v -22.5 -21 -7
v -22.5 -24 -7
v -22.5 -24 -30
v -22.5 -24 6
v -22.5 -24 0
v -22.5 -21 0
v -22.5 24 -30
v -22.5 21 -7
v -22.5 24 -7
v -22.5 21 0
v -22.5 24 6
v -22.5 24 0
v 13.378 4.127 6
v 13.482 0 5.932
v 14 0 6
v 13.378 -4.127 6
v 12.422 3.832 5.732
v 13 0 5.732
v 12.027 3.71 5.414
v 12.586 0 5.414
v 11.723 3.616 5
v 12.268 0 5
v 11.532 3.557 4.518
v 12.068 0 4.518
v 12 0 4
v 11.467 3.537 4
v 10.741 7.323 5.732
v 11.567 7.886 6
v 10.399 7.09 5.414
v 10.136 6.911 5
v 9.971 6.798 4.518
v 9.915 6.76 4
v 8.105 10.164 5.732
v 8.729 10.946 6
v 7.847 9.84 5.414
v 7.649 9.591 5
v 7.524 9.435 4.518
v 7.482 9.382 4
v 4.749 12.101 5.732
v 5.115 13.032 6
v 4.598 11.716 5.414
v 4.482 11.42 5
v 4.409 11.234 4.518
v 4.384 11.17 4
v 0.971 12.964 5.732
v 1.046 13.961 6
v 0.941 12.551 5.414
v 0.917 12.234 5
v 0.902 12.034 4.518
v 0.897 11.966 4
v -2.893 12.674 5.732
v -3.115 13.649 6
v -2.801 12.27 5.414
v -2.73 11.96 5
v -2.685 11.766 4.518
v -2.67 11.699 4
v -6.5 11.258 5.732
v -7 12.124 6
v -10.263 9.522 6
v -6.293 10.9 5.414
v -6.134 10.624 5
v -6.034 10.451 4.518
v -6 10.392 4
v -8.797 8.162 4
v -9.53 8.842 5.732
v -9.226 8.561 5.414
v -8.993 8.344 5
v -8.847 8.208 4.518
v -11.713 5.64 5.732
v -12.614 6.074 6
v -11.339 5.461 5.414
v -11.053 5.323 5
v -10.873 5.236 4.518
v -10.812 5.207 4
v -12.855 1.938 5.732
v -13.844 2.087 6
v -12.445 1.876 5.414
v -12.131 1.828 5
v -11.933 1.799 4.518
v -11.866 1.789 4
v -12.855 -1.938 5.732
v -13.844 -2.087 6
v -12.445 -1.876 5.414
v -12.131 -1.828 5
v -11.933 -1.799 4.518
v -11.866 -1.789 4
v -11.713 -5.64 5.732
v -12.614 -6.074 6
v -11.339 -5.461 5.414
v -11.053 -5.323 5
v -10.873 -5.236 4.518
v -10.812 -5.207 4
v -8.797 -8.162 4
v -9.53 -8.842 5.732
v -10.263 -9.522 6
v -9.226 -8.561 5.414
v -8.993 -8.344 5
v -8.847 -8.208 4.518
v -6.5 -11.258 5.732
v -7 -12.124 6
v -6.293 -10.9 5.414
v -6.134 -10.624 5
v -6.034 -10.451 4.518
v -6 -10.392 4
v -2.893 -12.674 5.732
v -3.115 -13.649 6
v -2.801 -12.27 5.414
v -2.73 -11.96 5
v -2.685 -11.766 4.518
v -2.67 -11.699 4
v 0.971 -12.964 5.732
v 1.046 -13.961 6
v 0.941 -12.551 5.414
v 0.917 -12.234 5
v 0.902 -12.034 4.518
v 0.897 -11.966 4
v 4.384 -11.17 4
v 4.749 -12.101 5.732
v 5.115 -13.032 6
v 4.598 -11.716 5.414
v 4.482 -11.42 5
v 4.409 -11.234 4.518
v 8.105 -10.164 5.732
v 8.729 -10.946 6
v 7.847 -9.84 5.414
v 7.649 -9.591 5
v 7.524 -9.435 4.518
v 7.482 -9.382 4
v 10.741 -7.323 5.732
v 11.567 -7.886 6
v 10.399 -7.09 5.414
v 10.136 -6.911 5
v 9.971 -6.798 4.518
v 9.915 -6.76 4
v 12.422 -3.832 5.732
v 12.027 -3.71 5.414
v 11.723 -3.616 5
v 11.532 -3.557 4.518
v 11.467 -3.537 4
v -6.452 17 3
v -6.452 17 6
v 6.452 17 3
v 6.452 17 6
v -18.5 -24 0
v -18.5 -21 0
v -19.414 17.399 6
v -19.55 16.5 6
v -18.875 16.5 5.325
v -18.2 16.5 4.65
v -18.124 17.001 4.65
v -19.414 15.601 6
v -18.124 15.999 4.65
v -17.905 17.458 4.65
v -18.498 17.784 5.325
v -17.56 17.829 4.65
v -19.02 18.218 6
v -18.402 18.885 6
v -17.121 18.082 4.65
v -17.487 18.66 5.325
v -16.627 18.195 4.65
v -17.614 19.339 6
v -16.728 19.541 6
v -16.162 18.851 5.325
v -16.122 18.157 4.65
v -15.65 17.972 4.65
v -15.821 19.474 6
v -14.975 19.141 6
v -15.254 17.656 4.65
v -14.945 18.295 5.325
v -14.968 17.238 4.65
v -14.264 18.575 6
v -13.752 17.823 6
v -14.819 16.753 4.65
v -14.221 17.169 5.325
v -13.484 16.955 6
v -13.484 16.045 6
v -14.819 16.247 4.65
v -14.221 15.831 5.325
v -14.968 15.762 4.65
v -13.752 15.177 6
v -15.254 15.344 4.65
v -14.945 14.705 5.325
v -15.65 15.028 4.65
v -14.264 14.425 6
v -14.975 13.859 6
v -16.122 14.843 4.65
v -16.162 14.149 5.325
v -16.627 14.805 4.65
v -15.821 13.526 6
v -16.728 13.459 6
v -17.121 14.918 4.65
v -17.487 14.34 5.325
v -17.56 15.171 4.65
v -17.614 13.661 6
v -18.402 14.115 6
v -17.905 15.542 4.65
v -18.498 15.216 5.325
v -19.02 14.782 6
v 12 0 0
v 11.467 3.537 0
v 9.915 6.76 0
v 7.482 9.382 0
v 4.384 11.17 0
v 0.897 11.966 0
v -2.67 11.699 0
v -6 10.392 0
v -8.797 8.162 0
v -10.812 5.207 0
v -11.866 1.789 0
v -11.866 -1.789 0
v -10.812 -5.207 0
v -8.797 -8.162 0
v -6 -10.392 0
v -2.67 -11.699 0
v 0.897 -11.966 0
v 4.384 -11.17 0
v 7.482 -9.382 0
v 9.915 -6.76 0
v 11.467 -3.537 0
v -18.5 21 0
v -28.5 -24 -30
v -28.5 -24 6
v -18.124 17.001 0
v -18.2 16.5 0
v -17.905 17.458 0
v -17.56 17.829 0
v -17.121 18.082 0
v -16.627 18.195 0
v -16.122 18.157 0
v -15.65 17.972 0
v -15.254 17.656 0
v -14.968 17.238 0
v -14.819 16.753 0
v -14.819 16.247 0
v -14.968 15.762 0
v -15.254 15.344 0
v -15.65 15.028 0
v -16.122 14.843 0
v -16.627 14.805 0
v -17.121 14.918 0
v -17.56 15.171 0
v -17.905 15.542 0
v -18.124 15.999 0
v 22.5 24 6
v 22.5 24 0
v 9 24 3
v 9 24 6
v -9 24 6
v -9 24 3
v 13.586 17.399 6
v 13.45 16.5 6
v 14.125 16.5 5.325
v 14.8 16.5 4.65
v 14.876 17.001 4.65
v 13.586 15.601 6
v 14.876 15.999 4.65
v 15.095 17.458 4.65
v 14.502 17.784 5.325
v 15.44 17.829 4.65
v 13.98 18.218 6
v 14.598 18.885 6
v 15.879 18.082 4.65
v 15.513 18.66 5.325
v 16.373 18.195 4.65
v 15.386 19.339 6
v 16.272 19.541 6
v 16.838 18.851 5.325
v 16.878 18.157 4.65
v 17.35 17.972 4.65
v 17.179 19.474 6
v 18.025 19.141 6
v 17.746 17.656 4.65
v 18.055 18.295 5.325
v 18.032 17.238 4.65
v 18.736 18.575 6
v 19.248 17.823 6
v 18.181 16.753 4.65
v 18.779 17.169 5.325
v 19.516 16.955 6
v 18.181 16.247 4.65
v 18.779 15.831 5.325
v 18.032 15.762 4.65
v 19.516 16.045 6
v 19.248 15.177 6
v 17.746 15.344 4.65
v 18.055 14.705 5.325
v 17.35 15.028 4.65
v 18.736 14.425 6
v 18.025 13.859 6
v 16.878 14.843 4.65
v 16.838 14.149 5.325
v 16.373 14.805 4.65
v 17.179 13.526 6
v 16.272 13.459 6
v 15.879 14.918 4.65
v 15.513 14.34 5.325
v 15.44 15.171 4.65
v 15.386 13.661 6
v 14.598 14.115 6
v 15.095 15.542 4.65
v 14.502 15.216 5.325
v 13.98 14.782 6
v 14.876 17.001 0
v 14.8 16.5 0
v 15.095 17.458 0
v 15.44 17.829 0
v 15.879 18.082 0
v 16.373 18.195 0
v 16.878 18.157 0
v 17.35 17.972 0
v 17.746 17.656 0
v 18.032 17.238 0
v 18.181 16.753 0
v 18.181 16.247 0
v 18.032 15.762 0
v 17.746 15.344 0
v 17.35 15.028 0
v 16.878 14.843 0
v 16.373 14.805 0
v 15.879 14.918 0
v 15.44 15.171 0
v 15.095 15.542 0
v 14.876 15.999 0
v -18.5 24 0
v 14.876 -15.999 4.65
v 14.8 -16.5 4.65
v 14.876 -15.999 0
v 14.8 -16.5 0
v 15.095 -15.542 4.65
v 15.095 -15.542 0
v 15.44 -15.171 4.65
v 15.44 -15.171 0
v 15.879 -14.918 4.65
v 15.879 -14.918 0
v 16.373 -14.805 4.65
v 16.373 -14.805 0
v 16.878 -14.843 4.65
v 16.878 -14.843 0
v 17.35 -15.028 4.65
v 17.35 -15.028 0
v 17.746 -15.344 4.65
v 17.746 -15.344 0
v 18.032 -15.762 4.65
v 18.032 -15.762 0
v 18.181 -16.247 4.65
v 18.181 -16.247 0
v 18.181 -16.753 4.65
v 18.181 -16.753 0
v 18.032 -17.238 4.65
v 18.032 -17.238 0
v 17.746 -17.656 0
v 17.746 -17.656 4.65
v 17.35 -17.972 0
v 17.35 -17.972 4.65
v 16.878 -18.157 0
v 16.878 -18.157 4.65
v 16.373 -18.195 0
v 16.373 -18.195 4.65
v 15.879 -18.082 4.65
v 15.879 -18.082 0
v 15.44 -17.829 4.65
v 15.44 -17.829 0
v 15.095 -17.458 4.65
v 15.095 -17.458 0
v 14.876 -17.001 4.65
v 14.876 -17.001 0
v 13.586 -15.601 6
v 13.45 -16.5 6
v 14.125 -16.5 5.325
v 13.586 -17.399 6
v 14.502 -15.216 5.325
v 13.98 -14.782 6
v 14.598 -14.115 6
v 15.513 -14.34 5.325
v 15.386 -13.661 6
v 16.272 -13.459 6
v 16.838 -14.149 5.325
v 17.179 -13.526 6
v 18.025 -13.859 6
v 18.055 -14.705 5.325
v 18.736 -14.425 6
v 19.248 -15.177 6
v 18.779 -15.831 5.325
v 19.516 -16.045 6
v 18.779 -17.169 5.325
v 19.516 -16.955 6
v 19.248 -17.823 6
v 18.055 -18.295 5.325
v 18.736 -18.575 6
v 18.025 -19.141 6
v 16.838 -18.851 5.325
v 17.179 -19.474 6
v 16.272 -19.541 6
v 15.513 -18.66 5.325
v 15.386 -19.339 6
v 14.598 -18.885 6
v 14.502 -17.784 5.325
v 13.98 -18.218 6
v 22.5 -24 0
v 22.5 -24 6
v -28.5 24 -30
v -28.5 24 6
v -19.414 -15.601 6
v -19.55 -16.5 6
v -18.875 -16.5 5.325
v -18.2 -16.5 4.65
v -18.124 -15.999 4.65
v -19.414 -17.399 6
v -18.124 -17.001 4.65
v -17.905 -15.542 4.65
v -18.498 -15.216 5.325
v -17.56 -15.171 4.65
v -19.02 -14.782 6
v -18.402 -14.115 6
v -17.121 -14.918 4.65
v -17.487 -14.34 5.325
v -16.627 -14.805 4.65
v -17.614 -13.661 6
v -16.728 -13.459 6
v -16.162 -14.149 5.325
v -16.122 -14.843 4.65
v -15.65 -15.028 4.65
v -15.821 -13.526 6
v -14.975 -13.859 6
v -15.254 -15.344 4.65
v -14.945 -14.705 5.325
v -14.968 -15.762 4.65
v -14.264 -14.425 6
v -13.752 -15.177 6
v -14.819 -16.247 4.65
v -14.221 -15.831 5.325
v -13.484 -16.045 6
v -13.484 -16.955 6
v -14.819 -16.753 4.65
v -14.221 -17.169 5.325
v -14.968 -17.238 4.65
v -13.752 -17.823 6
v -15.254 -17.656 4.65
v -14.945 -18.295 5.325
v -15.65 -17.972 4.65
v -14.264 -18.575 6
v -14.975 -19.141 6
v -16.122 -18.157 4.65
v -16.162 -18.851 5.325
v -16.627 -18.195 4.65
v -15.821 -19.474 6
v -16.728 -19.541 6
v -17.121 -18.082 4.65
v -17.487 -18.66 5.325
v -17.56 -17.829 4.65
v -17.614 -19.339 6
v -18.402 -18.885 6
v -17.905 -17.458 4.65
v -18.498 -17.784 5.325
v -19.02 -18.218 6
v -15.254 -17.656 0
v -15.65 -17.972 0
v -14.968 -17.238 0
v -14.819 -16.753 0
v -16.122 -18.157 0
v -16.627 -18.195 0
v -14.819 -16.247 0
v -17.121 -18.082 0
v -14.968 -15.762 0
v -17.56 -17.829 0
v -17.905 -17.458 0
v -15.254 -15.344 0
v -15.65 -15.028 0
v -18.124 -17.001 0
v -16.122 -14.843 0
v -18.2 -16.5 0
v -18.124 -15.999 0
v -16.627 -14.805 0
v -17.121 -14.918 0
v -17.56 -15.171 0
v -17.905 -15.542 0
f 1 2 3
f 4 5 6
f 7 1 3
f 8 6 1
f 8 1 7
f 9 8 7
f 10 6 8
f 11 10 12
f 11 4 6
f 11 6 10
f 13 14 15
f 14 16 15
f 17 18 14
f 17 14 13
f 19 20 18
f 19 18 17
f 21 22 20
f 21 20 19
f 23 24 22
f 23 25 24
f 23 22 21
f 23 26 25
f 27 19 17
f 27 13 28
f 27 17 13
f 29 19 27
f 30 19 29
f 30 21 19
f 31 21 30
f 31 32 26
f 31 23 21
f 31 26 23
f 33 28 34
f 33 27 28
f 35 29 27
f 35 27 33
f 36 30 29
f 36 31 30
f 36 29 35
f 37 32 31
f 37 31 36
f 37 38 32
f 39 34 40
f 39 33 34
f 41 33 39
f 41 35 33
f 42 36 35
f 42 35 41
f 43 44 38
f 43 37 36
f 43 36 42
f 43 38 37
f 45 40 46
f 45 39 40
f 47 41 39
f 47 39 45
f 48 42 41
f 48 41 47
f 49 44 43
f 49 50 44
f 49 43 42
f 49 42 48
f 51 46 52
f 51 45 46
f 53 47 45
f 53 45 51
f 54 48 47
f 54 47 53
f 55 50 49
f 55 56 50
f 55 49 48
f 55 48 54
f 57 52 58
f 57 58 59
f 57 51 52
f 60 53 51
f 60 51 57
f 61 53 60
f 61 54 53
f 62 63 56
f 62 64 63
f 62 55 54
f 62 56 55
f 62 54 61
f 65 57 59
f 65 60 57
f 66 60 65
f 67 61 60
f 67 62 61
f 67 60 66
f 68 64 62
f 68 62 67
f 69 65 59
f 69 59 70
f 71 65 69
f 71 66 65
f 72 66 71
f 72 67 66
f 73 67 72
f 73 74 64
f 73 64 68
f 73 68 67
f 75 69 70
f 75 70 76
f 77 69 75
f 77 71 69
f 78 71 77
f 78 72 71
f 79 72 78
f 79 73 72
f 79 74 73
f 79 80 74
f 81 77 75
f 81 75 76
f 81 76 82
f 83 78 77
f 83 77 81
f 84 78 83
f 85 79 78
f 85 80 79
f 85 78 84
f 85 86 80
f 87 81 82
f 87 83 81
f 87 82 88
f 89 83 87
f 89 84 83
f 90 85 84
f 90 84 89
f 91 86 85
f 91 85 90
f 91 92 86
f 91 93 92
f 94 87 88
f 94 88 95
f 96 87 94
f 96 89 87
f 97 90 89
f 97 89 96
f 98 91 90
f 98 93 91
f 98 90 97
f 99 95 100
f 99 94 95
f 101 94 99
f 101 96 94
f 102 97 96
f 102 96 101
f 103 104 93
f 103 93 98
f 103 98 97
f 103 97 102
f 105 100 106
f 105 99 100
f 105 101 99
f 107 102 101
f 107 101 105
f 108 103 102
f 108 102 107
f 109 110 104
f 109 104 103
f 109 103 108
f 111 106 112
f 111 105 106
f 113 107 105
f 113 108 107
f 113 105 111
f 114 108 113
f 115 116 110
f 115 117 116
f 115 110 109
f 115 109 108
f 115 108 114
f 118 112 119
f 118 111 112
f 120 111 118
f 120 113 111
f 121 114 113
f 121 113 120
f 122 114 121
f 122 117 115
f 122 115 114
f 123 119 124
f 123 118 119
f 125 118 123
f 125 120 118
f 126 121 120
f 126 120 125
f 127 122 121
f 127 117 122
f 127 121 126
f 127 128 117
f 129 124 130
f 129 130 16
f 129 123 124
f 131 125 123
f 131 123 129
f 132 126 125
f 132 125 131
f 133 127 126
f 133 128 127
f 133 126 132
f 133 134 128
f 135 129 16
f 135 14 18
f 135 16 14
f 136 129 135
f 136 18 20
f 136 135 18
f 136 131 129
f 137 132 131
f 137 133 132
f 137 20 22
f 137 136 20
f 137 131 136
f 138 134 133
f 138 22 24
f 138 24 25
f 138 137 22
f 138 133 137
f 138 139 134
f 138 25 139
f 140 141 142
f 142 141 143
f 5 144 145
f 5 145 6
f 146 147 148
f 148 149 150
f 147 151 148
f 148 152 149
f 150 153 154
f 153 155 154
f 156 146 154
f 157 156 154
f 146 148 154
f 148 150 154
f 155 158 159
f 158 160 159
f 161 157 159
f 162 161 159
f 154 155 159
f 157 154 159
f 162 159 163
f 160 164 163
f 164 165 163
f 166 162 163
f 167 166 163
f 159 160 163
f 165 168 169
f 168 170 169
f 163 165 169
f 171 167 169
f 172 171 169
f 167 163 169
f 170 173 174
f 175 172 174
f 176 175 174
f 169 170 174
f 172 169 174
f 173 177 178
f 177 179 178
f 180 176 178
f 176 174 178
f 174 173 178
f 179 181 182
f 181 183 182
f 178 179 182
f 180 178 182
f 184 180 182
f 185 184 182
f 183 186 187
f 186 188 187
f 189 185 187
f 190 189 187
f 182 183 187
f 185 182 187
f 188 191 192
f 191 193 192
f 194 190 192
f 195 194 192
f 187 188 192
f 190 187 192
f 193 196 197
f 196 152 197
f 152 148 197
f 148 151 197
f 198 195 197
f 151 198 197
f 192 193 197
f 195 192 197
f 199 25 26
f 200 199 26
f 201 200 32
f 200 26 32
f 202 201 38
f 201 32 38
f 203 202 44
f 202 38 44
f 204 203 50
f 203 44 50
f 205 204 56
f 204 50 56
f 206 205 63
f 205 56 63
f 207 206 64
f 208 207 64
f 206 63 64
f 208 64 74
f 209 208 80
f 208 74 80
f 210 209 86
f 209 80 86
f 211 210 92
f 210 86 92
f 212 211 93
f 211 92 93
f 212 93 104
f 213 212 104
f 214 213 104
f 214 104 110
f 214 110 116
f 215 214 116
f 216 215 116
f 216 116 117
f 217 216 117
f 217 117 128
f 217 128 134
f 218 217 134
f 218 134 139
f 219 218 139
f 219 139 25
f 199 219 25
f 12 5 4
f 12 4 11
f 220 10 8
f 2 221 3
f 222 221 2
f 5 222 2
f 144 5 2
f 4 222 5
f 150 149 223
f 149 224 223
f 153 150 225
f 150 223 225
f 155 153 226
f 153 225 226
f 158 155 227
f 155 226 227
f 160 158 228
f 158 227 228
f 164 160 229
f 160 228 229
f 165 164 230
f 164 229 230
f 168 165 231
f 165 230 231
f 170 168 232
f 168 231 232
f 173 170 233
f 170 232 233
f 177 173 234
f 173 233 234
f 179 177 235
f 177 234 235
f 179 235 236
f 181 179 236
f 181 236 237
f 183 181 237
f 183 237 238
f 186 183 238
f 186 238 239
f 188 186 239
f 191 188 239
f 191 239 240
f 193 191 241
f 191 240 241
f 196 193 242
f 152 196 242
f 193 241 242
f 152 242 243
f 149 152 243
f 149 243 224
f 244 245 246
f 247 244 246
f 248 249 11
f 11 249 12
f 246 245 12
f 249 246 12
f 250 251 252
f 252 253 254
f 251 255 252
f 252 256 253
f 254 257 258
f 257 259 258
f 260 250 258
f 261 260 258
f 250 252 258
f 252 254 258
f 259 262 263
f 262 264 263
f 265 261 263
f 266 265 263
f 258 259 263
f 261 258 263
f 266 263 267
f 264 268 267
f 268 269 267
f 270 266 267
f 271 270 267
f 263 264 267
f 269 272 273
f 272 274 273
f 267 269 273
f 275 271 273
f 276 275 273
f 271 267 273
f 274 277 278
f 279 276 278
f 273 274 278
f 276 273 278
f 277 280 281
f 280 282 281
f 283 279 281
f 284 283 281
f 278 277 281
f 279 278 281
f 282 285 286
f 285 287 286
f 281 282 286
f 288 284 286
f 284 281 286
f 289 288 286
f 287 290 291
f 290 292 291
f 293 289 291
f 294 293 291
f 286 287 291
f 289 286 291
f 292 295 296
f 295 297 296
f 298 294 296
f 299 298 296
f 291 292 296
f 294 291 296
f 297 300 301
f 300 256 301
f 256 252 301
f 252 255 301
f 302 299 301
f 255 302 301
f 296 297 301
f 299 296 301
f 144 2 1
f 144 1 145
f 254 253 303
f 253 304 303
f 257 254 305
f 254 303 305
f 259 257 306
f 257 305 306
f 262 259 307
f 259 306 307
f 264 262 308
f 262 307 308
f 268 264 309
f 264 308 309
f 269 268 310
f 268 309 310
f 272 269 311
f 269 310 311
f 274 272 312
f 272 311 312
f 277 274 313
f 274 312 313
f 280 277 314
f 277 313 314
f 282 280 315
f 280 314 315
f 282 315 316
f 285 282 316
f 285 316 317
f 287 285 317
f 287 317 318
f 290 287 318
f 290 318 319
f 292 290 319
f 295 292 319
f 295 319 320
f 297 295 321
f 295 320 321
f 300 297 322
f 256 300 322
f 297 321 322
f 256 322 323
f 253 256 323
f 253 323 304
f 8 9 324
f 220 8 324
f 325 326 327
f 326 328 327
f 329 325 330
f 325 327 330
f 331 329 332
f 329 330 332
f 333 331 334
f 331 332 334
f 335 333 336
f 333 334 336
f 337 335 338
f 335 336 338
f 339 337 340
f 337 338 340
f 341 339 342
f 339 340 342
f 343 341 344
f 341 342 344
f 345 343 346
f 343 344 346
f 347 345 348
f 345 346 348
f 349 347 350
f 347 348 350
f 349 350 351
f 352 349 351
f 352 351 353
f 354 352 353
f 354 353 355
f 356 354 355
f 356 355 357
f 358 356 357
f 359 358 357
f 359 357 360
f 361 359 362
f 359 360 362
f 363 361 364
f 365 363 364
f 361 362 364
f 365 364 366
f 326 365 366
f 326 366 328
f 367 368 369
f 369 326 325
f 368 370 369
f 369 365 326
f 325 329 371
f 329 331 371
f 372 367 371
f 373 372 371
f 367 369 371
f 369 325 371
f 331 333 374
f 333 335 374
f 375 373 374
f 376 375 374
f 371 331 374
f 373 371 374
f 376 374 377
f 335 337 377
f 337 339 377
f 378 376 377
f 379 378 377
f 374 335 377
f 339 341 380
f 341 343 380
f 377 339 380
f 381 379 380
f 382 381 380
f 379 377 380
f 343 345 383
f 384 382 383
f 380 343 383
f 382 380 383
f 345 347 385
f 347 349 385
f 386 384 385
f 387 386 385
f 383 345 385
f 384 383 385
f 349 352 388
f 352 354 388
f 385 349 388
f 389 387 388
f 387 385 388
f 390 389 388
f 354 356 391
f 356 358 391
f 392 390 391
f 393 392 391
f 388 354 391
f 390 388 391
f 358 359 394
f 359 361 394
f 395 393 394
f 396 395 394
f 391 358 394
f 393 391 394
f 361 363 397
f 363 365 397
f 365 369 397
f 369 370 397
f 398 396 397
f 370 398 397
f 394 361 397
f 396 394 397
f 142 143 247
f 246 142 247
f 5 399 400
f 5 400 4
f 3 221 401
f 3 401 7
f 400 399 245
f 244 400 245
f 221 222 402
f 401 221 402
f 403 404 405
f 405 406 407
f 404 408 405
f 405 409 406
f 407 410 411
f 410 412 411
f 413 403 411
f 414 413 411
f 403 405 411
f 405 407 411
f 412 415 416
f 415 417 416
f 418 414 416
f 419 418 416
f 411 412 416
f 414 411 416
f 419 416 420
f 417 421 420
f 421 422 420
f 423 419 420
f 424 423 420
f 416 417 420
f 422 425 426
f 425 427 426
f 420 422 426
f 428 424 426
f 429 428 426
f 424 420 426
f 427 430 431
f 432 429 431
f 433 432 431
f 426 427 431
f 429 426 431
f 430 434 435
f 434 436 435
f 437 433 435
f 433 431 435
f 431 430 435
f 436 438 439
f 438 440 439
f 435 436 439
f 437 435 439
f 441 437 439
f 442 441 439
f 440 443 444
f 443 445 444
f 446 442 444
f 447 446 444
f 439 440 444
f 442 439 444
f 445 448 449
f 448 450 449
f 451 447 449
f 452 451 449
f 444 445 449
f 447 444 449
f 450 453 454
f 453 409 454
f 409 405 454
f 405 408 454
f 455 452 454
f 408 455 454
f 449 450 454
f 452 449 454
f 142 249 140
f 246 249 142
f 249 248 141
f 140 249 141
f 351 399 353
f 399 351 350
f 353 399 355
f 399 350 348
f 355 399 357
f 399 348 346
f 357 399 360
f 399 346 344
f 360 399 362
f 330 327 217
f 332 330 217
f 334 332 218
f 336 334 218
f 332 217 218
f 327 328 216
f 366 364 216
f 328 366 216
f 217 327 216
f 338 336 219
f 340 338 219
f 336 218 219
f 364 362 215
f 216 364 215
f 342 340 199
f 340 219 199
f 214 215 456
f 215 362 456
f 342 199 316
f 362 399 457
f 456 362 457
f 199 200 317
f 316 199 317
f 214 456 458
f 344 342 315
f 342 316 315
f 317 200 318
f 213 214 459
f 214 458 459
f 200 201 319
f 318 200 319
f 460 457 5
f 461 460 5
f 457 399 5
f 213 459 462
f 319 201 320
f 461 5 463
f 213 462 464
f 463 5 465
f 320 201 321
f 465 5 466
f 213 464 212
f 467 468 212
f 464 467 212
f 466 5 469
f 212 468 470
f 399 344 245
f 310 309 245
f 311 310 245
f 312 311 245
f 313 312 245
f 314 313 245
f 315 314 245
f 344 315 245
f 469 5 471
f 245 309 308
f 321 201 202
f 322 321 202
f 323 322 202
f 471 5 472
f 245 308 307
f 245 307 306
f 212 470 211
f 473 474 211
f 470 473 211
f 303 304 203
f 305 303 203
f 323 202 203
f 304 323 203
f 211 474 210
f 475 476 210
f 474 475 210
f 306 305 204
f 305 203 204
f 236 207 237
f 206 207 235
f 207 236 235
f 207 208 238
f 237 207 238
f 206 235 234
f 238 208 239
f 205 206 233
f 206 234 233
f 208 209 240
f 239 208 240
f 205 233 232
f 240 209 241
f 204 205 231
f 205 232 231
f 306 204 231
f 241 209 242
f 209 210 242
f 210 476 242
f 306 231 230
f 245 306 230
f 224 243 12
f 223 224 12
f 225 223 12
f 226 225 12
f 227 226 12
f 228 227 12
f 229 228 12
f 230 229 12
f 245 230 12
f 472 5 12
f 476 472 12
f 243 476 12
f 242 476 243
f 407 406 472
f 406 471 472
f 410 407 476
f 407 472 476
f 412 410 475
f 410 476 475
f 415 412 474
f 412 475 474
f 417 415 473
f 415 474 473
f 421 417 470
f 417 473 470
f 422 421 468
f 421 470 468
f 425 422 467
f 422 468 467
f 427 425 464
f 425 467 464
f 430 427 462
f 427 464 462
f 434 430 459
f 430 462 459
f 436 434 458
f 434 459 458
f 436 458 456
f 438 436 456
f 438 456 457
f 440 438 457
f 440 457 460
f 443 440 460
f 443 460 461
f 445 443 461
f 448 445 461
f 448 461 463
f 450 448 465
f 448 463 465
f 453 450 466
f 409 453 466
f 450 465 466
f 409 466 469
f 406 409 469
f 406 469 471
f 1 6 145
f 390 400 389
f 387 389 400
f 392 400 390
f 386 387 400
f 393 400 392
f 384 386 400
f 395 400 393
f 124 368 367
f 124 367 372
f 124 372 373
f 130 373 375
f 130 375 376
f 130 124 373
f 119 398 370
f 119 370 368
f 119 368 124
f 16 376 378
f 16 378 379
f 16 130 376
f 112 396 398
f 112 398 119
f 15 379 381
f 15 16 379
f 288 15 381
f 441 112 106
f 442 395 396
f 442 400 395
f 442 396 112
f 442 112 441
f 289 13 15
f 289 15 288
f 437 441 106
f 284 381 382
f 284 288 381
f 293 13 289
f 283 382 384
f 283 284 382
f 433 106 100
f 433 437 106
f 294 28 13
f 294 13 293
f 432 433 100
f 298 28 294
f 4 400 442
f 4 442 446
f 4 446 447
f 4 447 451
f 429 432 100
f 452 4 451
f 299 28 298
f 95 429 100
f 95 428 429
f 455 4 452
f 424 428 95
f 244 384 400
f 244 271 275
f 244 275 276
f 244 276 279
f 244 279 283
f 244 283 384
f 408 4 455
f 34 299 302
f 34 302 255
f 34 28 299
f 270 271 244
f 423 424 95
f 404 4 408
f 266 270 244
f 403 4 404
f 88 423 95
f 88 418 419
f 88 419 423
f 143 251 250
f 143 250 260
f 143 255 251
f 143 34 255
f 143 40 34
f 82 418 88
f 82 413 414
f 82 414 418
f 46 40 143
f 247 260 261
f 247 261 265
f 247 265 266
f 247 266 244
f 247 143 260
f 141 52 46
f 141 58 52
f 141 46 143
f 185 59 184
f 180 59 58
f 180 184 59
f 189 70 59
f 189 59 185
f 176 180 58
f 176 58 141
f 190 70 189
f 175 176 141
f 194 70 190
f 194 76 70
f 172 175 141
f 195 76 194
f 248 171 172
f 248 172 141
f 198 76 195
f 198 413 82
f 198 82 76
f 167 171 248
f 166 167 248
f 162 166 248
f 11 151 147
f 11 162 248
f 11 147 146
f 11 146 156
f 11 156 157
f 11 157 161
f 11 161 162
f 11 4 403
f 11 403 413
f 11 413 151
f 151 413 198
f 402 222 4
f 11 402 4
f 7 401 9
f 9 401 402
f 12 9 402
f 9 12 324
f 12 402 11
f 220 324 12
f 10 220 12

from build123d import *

# Parameters (mm, degrees)
BINDER006_W         = 48
BINDER006_H         = 45
PAD003_DEPTH        = 6
HOLE002_D           = 3.4
HOLE002_CSINK_D     = 6.1
HOLE002_CSINK_ANGLE = 90
SKETCH013_R         = 12
POCKET003_DEPTH     = 6.001
FILLET001_R         = 2
POCKET004_DEPTH     = 3
SKETCH010_W         = 6
SKETCH010_H         = 48
PAD004_DEPTH        = 6
PAD004_DEPTH_BACK   = 30
PAD005_DEPTH        = 3


with BuildPart() as body005:
    # Binder006 → Pad003 (new body)
    with BuildSketch(Plane(origin=(0, 0, 0), x_dir=(0, 1, 0), z_dir=(0, 0, 1))):
        Rectangle(BINDER006_W, BINDER006_H)
    extrude(amount=PAD003_DEPTH)

    # Hole002 (through all)
    with Locations(Plane.XY.offset(6)):
        with Locations((-16.5, 16.5), (-16.5, -16.5), (16.5, -16.5), (16.5, 16.5)):
            CounterSinkHole(HOLE002_D / 2, HOLE002_CSINK_D / 2, counter_sink_angle=HOLE002_CSINK_ANGLE)

    # Sketch013 (on Face5 of Hole002) → Pocket003 (cut, through all)
    with BuildSketch(Plane.XY.offset(6)):
        Circle(SKETCH013_R)
    extrude(amount=-POCKET003_DEPTH, mode=Mode.SUBTRACT)

    # Fillet001
    fillet001_edges = [body005.edges().sort_by_distance(p)[0] for p in [
        (-12, 0, 6),
    ]]
    fillet(fillet001_edges, radius=FILLET001_R)

    # Sketch014 (on Face1 of Fillet001) → Pocket004 (cut)
    with BuildSketch(Plane.XY.offset(6)):
        Polygon((-9, 24), (-6.452208, 17), (6.452208, 17), (9, 24), align=None)
    extrude(amount=-POCKET004_DEPTH, mode=Mode.SUBTRACT)


with BuildPart() as body006:
    # Sketch010 (on Face1 of Binder007) → Pad004 (new body, two sides)
    with BuildSketch(Plane.XY) as pad004_sk:
        with Locations((-25.5, 0)):
            Rectangle(SKETCH010_W, SKETCH010_H)
    extrude(amount=PAD004_DEPTH)
    extrude(pad004_sk.sketch, amount=-PAD004_DEPTH_BACK)

    # Sketch011 (on Face3 of Pad004) → Pad005 (join)
    with BuildSketch(Plane.XZ.offset(24)):
        Polygon((-22.5, 0), (-22.5, -7), (-18.5, 0), align=None)
    pad005 = extrude(amount=-PAD005_DEPTH)

    # Mirrored001: Pad005 across XZ
    add(pad005.mirror(Plane.XZ))


solid = Compound([body005.part, body006.part])
